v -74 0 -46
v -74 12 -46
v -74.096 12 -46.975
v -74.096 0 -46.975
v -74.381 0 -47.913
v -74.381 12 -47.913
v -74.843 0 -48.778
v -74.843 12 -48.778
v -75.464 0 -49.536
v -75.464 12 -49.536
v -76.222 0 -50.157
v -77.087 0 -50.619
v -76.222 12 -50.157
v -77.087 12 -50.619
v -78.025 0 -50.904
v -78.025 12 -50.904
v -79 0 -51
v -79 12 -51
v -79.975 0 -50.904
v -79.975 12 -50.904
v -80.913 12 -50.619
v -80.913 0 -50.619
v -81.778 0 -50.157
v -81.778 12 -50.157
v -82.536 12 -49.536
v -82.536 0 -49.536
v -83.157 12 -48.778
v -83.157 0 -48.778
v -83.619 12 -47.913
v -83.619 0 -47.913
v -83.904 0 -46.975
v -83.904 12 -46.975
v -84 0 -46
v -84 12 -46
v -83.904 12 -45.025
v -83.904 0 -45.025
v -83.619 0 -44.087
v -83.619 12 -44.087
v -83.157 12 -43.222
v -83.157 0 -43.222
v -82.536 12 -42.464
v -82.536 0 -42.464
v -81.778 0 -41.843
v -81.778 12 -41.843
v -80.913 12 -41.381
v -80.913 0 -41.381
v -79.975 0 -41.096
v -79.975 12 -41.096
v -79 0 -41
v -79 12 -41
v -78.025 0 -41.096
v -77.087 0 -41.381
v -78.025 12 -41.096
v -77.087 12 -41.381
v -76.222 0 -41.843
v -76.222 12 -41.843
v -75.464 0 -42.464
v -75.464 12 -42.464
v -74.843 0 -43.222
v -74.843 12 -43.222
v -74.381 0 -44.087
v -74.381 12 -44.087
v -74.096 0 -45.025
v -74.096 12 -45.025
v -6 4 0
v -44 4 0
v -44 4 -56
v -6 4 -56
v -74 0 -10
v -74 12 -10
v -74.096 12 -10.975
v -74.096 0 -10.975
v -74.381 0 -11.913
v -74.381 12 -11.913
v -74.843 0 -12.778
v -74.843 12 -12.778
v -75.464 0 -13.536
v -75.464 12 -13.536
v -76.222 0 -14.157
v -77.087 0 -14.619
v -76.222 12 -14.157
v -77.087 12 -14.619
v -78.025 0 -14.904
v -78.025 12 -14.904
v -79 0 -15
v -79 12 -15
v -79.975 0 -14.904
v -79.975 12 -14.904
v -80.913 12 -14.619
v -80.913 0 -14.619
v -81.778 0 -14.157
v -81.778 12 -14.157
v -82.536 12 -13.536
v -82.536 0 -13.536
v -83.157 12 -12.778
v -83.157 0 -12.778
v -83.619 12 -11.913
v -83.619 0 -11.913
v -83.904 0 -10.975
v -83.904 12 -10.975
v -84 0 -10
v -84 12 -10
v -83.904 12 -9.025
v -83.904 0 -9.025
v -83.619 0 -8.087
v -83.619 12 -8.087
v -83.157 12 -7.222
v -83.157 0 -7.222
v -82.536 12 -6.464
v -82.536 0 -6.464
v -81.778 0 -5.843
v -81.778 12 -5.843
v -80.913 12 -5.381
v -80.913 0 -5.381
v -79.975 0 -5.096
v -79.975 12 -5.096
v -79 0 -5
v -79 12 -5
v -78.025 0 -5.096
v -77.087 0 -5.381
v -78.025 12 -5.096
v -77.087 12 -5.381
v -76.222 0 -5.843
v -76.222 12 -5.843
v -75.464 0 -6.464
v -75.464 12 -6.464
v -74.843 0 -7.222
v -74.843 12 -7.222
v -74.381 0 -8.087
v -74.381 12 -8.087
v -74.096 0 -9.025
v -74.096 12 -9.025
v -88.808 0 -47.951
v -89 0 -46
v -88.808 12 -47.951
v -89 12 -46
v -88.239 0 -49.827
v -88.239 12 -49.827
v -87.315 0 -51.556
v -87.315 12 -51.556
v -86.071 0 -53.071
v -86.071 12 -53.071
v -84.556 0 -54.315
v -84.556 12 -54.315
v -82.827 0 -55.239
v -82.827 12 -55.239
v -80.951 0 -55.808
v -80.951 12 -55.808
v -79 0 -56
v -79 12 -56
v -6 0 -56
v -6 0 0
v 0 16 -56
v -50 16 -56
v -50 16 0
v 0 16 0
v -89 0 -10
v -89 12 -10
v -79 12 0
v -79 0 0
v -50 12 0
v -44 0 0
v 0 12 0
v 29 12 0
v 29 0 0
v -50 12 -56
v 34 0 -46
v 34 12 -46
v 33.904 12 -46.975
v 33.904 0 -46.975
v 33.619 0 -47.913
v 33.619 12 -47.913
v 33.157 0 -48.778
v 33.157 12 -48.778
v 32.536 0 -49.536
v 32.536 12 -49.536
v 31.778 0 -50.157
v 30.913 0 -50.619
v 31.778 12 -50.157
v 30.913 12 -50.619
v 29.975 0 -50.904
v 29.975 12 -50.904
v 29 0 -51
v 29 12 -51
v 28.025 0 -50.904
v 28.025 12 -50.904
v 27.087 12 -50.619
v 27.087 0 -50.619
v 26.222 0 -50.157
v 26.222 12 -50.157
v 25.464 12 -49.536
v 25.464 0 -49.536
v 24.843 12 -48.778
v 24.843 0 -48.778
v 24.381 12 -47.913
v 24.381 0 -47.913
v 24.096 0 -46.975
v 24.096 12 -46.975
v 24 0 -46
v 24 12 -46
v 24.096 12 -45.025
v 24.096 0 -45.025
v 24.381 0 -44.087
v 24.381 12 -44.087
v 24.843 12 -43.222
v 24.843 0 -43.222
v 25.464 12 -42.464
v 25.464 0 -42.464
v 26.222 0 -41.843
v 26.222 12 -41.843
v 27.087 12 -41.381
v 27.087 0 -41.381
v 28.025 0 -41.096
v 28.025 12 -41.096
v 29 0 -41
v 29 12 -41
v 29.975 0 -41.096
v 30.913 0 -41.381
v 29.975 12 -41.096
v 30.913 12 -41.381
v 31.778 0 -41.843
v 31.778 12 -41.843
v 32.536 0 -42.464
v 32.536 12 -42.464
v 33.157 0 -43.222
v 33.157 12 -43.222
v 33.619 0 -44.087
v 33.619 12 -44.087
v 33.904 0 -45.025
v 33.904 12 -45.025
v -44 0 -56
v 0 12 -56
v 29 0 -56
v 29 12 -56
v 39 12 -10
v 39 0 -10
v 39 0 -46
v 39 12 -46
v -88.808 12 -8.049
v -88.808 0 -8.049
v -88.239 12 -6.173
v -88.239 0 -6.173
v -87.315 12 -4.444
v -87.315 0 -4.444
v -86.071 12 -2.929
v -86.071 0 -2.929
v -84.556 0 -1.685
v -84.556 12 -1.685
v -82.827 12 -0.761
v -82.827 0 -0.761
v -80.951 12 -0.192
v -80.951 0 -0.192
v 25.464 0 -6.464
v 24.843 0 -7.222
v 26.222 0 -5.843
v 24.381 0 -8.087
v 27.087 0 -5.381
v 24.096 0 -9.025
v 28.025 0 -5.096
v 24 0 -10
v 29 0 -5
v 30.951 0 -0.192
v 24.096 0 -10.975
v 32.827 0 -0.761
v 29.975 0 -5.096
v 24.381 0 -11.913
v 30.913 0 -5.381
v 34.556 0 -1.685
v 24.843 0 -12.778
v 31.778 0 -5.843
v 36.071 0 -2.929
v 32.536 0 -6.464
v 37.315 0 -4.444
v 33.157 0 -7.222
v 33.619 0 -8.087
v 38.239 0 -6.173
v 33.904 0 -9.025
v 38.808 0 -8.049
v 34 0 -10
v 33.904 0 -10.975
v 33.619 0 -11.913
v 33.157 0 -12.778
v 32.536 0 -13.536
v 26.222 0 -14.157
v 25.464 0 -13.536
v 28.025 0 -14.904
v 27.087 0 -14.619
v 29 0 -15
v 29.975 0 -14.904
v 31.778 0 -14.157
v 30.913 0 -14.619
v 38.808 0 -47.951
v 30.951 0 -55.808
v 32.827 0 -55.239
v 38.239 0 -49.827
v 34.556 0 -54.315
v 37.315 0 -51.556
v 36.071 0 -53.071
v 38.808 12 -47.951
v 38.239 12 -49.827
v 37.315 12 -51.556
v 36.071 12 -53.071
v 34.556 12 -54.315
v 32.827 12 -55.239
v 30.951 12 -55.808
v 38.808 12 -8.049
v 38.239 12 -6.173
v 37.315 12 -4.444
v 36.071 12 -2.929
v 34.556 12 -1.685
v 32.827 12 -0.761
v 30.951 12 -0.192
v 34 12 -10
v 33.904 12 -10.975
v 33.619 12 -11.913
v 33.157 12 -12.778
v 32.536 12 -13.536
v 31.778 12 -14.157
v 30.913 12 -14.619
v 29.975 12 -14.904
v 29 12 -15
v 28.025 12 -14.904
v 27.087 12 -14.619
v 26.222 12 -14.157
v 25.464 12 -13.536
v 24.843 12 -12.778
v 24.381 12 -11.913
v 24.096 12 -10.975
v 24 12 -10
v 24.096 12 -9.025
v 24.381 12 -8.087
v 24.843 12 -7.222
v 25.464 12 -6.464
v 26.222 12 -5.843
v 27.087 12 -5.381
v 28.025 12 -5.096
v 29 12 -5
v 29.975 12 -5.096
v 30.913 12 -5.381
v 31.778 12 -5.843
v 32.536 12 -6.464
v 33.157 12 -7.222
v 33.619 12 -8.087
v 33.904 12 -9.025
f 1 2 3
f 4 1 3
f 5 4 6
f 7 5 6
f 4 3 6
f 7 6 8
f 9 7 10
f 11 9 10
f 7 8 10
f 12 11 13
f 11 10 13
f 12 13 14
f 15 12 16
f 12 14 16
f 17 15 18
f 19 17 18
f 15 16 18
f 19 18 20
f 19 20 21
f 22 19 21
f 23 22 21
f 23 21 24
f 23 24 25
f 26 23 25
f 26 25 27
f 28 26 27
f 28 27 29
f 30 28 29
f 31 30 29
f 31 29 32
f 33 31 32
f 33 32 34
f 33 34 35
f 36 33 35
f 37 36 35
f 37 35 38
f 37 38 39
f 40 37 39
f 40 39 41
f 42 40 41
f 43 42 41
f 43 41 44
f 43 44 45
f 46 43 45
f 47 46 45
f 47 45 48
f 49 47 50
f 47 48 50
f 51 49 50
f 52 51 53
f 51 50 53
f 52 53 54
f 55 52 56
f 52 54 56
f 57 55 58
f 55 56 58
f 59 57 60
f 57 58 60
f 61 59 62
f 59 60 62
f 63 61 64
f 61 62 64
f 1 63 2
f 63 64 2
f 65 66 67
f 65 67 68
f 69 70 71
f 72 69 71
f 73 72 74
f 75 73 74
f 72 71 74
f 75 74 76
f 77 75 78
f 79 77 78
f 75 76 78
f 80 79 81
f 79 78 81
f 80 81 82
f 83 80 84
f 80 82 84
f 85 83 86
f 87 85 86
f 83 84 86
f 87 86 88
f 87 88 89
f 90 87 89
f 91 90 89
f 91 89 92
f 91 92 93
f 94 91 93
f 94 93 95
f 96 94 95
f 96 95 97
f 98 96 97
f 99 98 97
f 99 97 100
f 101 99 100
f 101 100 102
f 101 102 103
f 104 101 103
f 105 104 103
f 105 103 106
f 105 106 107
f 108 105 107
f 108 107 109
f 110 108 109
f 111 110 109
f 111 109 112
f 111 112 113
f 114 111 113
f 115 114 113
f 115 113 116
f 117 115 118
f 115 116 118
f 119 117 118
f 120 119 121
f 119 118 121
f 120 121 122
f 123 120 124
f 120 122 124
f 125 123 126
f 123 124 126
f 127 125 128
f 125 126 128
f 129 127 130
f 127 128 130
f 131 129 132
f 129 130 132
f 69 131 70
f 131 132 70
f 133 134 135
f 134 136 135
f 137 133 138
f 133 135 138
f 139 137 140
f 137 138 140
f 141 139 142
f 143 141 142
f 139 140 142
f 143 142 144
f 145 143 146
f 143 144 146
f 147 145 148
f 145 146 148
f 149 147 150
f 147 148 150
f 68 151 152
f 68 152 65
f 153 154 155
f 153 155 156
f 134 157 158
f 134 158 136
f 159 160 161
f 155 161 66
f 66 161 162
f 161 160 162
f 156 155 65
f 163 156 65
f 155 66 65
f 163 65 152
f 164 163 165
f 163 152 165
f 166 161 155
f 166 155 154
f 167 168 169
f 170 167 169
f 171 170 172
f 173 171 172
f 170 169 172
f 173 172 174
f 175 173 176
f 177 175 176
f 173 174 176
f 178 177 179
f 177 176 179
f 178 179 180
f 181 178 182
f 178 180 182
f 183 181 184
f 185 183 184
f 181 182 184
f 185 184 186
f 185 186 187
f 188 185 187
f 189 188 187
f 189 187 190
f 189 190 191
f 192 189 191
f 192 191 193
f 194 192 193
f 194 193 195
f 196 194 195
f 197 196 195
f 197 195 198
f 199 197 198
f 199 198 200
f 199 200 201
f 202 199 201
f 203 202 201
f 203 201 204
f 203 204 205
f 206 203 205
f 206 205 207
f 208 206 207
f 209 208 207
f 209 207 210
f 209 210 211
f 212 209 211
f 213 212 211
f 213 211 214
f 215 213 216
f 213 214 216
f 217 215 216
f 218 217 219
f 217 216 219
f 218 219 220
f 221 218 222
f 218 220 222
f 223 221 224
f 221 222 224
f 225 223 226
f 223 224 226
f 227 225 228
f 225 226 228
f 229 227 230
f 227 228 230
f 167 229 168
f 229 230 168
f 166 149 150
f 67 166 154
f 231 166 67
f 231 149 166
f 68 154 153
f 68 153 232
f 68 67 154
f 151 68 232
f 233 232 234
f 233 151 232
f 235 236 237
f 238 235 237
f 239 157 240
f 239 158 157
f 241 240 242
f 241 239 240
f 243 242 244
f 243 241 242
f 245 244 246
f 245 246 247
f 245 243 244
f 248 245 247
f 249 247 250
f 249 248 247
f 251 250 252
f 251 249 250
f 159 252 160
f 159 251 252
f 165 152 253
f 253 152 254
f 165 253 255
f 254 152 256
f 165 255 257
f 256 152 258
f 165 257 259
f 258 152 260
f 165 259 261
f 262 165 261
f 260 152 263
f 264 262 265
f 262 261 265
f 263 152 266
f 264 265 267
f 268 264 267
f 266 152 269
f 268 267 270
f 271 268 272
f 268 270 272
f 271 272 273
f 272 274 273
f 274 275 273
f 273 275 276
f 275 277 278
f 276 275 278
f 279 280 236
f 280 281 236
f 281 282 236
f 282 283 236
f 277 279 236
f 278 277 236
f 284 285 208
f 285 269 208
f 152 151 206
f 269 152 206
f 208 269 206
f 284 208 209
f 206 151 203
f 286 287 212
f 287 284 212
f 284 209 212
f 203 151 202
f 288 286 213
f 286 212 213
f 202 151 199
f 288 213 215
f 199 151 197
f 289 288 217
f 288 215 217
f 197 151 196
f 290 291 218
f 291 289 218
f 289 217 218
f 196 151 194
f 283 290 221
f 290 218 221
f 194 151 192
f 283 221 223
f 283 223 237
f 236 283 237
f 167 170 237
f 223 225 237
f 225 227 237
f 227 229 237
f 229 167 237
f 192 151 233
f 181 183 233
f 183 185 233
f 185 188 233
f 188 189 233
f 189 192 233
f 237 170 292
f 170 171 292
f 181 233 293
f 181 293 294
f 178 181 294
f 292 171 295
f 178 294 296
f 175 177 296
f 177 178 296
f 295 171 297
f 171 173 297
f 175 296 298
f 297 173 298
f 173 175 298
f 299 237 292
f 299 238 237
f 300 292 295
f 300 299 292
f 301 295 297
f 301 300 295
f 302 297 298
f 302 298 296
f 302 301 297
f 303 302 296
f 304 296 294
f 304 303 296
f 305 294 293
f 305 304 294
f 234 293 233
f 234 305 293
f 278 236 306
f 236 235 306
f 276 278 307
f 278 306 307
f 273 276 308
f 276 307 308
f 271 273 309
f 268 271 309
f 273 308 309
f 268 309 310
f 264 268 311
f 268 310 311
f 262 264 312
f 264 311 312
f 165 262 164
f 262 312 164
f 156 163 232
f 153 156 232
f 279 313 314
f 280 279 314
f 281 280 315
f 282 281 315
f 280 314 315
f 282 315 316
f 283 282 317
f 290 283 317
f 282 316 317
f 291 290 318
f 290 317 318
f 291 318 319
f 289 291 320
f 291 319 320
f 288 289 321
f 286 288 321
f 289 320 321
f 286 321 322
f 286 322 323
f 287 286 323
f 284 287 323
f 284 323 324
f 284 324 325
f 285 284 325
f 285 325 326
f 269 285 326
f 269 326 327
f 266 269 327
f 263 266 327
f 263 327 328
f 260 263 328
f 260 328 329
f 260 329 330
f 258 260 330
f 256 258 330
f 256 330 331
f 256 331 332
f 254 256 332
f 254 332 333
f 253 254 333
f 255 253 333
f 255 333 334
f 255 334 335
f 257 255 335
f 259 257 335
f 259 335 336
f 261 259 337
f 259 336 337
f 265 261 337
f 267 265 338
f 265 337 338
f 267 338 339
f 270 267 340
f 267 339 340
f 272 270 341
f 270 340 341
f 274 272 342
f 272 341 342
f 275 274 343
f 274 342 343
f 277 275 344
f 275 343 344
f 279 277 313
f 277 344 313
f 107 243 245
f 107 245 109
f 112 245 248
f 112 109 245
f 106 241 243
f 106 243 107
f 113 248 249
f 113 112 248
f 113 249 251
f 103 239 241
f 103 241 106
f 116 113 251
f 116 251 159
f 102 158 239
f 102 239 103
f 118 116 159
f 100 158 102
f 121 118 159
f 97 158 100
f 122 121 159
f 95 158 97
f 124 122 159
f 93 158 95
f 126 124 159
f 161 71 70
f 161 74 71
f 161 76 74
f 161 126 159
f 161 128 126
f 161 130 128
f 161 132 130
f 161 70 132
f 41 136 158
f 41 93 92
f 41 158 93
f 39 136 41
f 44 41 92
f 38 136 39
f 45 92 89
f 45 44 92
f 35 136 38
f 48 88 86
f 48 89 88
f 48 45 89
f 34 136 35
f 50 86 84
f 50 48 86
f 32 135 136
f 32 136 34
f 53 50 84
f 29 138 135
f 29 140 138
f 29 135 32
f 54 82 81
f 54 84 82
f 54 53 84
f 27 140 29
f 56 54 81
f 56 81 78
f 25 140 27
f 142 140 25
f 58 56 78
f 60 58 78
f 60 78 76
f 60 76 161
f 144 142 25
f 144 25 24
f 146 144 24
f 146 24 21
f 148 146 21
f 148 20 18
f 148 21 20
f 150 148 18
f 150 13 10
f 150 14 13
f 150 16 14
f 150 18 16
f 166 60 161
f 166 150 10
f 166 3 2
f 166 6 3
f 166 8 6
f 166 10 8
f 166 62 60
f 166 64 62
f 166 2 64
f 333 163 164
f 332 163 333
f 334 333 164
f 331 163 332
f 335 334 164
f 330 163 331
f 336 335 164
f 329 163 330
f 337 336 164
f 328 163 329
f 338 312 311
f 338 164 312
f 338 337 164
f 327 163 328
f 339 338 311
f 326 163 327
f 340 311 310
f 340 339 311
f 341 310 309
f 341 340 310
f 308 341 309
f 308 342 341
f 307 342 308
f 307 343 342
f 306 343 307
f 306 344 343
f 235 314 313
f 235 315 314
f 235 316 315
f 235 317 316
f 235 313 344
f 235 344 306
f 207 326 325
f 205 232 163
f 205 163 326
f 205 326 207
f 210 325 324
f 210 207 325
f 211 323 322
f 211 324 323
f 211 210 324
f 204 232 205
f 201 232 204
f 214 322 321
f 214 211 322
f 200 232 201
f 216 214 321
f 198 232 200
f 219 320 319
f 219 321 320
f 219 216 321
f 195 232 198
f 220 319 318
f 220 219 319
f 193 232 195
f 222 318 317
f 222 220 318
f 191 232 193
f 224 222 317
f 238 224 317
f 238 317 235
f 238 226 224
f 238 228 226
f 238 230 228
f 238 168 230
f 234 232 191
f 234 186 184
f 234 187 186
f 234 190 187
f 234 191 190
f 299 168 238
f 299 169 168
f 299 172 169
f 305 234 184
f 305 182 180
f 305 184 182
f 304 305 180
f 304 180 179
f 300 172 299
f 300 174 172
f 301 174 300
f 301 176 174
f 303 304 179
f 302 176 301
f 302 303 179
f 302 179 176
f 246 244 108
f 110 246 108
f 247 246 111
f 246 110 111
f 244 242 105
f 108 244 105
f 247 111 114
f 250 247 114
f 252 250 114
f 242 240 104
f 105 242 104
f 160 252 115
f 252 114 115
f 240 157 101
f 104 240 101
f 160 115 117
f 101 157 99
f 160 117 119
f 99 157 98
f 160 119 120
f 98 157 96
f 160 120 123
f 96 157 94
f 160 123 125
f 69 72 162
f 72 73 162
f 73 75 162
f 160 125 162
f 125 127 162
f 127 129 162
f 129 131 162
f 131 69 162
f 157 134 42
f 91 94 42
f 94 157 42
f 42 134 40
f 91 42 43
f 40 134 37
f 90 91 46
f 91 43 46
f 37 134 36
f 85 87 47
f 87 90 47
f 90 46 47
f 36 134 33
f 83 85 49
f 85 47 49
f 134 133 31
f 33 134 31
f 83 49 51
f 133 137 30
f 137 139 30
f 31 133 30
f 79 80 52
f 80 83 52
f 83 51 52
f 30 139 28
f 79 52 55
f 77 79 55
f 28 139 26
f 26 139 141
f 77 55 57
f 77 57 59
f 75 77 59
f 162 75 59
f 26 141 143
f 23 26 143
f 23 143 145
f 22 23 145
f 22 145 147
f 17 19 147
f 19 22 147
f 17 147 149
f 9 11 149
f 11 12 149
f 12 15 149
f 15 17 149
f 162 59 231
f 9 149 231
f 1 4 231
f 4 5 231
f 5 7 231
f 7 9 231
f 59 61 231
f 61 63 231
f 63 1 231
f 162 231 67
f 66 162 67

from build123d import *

# Parameters (mm, degrees)
IZIM1_W                     = 50
IZIM1_H                     = 56
Y_KSEKLIK_EKSTR_ZYON1_DEPTH = 16
IZIM1_3_W                   = 39
IZIM1_3_H                   = 56
Y_KSEKLIK_EKSTR_ZYON2_DEPTH = 12
RADYUS1_R                   = 10
IZIM2_R                     = 5
KES_EKSTR_ZYON1_DEPTH       = 13
IZIM3_R                     = 5
KES_EKSTR_ZYON2_DEPTH       = 13
IZIM4_W                     = 38
IZIM4_H                     = 4
KES_EKSTR_ZYON4_DEPTH       = 57


with BuildPart() as part:
    # Çizim1 → Yükseklik-Ekstrüzyon1 (new body)
    with BuildSketch(Plane(origin=(0, 0, 0), x_dir=(1, 0, 0), z_dir=(0, 1, 0))):
        with Locations((-25, 28)):
            Rectangle(IZIM1_W, IZIM1_H)
    extrude(amount=Y_KSEKLIK_EKSTR_ZYON1_DEPTH)

    # Çizim1<3> → Yükseklik-Ekstrüzyon2 (add)
    with BuildSketch(Plane(origin=(0, 0, 0), x_dir=(1, 0, 0), z_dir=(0, 1, 0))):
        with Locations((-69.5, 28)):
            Rectangle(IZIM1_3_W, IZIM1_3_H)
        with Locations((19.5, 28)):
            Rectangle(IZIM1_3_W, IZIM1_3_H)
    extrude(amount=Y_KSEKLIK_EKSTR_ZYON2_DEPTH)

    # Radyus1
    radyus1_edges = [part.edges().sort_by_distance(p)[0] for p in [
        (-89, 6, -56),
        (-89, 6, 0),
        (39, 6, 0),
        (39, 6, -56),
    ]]
    fillet(radyus1_edges, radius=RADYUS1_R)

    # Çizim2 → Kes-Ekstrüzyon1 (cut, through all)
    with BuildSketch(Plane(origin=(0, 12, 0), x_dir=(1, 0, 0), z_dir=(0, 1, 0))):
        with Locations((-79, 46)):
            Circle(IZIM2_R)
        with Locations((-79, 10)):
            Circle(IZIM2_R)
    extrude(amount=-KES_EKSTR_ZYON1_DEPTH, mode=Mode.SUBTRACT)

    # Çizim3 → Kes-Ekstrüzyon2 (cut, through all)
    with BuildSketch(Plane(origin=(0, 12, 0), x_dir=(1, 0, 0), z_dir=(0, 1, 0))):
        with Locations((29, 46)):
            Circle(IZIM3_R)
        with Locations((29, 10)):
            Circle(IZIM3_R)
    extrude(amount=-KES_EKSTR_ZYON2_DEPTH, mode=Mode.SUBTRACT)

    # Çizim4 → Kes-Ekstrüzyon4 (cut, through all)
    with BuildSketch(Plane.XY):
        with Locations((-25, 2)):
            Rectangle(IZIM4_W, IZIM4_H)
    extrude(amount=-KES_EKSTR_ZYON4_DEPTH, mode=Mode.SUBTRACT)


solid = part.part
